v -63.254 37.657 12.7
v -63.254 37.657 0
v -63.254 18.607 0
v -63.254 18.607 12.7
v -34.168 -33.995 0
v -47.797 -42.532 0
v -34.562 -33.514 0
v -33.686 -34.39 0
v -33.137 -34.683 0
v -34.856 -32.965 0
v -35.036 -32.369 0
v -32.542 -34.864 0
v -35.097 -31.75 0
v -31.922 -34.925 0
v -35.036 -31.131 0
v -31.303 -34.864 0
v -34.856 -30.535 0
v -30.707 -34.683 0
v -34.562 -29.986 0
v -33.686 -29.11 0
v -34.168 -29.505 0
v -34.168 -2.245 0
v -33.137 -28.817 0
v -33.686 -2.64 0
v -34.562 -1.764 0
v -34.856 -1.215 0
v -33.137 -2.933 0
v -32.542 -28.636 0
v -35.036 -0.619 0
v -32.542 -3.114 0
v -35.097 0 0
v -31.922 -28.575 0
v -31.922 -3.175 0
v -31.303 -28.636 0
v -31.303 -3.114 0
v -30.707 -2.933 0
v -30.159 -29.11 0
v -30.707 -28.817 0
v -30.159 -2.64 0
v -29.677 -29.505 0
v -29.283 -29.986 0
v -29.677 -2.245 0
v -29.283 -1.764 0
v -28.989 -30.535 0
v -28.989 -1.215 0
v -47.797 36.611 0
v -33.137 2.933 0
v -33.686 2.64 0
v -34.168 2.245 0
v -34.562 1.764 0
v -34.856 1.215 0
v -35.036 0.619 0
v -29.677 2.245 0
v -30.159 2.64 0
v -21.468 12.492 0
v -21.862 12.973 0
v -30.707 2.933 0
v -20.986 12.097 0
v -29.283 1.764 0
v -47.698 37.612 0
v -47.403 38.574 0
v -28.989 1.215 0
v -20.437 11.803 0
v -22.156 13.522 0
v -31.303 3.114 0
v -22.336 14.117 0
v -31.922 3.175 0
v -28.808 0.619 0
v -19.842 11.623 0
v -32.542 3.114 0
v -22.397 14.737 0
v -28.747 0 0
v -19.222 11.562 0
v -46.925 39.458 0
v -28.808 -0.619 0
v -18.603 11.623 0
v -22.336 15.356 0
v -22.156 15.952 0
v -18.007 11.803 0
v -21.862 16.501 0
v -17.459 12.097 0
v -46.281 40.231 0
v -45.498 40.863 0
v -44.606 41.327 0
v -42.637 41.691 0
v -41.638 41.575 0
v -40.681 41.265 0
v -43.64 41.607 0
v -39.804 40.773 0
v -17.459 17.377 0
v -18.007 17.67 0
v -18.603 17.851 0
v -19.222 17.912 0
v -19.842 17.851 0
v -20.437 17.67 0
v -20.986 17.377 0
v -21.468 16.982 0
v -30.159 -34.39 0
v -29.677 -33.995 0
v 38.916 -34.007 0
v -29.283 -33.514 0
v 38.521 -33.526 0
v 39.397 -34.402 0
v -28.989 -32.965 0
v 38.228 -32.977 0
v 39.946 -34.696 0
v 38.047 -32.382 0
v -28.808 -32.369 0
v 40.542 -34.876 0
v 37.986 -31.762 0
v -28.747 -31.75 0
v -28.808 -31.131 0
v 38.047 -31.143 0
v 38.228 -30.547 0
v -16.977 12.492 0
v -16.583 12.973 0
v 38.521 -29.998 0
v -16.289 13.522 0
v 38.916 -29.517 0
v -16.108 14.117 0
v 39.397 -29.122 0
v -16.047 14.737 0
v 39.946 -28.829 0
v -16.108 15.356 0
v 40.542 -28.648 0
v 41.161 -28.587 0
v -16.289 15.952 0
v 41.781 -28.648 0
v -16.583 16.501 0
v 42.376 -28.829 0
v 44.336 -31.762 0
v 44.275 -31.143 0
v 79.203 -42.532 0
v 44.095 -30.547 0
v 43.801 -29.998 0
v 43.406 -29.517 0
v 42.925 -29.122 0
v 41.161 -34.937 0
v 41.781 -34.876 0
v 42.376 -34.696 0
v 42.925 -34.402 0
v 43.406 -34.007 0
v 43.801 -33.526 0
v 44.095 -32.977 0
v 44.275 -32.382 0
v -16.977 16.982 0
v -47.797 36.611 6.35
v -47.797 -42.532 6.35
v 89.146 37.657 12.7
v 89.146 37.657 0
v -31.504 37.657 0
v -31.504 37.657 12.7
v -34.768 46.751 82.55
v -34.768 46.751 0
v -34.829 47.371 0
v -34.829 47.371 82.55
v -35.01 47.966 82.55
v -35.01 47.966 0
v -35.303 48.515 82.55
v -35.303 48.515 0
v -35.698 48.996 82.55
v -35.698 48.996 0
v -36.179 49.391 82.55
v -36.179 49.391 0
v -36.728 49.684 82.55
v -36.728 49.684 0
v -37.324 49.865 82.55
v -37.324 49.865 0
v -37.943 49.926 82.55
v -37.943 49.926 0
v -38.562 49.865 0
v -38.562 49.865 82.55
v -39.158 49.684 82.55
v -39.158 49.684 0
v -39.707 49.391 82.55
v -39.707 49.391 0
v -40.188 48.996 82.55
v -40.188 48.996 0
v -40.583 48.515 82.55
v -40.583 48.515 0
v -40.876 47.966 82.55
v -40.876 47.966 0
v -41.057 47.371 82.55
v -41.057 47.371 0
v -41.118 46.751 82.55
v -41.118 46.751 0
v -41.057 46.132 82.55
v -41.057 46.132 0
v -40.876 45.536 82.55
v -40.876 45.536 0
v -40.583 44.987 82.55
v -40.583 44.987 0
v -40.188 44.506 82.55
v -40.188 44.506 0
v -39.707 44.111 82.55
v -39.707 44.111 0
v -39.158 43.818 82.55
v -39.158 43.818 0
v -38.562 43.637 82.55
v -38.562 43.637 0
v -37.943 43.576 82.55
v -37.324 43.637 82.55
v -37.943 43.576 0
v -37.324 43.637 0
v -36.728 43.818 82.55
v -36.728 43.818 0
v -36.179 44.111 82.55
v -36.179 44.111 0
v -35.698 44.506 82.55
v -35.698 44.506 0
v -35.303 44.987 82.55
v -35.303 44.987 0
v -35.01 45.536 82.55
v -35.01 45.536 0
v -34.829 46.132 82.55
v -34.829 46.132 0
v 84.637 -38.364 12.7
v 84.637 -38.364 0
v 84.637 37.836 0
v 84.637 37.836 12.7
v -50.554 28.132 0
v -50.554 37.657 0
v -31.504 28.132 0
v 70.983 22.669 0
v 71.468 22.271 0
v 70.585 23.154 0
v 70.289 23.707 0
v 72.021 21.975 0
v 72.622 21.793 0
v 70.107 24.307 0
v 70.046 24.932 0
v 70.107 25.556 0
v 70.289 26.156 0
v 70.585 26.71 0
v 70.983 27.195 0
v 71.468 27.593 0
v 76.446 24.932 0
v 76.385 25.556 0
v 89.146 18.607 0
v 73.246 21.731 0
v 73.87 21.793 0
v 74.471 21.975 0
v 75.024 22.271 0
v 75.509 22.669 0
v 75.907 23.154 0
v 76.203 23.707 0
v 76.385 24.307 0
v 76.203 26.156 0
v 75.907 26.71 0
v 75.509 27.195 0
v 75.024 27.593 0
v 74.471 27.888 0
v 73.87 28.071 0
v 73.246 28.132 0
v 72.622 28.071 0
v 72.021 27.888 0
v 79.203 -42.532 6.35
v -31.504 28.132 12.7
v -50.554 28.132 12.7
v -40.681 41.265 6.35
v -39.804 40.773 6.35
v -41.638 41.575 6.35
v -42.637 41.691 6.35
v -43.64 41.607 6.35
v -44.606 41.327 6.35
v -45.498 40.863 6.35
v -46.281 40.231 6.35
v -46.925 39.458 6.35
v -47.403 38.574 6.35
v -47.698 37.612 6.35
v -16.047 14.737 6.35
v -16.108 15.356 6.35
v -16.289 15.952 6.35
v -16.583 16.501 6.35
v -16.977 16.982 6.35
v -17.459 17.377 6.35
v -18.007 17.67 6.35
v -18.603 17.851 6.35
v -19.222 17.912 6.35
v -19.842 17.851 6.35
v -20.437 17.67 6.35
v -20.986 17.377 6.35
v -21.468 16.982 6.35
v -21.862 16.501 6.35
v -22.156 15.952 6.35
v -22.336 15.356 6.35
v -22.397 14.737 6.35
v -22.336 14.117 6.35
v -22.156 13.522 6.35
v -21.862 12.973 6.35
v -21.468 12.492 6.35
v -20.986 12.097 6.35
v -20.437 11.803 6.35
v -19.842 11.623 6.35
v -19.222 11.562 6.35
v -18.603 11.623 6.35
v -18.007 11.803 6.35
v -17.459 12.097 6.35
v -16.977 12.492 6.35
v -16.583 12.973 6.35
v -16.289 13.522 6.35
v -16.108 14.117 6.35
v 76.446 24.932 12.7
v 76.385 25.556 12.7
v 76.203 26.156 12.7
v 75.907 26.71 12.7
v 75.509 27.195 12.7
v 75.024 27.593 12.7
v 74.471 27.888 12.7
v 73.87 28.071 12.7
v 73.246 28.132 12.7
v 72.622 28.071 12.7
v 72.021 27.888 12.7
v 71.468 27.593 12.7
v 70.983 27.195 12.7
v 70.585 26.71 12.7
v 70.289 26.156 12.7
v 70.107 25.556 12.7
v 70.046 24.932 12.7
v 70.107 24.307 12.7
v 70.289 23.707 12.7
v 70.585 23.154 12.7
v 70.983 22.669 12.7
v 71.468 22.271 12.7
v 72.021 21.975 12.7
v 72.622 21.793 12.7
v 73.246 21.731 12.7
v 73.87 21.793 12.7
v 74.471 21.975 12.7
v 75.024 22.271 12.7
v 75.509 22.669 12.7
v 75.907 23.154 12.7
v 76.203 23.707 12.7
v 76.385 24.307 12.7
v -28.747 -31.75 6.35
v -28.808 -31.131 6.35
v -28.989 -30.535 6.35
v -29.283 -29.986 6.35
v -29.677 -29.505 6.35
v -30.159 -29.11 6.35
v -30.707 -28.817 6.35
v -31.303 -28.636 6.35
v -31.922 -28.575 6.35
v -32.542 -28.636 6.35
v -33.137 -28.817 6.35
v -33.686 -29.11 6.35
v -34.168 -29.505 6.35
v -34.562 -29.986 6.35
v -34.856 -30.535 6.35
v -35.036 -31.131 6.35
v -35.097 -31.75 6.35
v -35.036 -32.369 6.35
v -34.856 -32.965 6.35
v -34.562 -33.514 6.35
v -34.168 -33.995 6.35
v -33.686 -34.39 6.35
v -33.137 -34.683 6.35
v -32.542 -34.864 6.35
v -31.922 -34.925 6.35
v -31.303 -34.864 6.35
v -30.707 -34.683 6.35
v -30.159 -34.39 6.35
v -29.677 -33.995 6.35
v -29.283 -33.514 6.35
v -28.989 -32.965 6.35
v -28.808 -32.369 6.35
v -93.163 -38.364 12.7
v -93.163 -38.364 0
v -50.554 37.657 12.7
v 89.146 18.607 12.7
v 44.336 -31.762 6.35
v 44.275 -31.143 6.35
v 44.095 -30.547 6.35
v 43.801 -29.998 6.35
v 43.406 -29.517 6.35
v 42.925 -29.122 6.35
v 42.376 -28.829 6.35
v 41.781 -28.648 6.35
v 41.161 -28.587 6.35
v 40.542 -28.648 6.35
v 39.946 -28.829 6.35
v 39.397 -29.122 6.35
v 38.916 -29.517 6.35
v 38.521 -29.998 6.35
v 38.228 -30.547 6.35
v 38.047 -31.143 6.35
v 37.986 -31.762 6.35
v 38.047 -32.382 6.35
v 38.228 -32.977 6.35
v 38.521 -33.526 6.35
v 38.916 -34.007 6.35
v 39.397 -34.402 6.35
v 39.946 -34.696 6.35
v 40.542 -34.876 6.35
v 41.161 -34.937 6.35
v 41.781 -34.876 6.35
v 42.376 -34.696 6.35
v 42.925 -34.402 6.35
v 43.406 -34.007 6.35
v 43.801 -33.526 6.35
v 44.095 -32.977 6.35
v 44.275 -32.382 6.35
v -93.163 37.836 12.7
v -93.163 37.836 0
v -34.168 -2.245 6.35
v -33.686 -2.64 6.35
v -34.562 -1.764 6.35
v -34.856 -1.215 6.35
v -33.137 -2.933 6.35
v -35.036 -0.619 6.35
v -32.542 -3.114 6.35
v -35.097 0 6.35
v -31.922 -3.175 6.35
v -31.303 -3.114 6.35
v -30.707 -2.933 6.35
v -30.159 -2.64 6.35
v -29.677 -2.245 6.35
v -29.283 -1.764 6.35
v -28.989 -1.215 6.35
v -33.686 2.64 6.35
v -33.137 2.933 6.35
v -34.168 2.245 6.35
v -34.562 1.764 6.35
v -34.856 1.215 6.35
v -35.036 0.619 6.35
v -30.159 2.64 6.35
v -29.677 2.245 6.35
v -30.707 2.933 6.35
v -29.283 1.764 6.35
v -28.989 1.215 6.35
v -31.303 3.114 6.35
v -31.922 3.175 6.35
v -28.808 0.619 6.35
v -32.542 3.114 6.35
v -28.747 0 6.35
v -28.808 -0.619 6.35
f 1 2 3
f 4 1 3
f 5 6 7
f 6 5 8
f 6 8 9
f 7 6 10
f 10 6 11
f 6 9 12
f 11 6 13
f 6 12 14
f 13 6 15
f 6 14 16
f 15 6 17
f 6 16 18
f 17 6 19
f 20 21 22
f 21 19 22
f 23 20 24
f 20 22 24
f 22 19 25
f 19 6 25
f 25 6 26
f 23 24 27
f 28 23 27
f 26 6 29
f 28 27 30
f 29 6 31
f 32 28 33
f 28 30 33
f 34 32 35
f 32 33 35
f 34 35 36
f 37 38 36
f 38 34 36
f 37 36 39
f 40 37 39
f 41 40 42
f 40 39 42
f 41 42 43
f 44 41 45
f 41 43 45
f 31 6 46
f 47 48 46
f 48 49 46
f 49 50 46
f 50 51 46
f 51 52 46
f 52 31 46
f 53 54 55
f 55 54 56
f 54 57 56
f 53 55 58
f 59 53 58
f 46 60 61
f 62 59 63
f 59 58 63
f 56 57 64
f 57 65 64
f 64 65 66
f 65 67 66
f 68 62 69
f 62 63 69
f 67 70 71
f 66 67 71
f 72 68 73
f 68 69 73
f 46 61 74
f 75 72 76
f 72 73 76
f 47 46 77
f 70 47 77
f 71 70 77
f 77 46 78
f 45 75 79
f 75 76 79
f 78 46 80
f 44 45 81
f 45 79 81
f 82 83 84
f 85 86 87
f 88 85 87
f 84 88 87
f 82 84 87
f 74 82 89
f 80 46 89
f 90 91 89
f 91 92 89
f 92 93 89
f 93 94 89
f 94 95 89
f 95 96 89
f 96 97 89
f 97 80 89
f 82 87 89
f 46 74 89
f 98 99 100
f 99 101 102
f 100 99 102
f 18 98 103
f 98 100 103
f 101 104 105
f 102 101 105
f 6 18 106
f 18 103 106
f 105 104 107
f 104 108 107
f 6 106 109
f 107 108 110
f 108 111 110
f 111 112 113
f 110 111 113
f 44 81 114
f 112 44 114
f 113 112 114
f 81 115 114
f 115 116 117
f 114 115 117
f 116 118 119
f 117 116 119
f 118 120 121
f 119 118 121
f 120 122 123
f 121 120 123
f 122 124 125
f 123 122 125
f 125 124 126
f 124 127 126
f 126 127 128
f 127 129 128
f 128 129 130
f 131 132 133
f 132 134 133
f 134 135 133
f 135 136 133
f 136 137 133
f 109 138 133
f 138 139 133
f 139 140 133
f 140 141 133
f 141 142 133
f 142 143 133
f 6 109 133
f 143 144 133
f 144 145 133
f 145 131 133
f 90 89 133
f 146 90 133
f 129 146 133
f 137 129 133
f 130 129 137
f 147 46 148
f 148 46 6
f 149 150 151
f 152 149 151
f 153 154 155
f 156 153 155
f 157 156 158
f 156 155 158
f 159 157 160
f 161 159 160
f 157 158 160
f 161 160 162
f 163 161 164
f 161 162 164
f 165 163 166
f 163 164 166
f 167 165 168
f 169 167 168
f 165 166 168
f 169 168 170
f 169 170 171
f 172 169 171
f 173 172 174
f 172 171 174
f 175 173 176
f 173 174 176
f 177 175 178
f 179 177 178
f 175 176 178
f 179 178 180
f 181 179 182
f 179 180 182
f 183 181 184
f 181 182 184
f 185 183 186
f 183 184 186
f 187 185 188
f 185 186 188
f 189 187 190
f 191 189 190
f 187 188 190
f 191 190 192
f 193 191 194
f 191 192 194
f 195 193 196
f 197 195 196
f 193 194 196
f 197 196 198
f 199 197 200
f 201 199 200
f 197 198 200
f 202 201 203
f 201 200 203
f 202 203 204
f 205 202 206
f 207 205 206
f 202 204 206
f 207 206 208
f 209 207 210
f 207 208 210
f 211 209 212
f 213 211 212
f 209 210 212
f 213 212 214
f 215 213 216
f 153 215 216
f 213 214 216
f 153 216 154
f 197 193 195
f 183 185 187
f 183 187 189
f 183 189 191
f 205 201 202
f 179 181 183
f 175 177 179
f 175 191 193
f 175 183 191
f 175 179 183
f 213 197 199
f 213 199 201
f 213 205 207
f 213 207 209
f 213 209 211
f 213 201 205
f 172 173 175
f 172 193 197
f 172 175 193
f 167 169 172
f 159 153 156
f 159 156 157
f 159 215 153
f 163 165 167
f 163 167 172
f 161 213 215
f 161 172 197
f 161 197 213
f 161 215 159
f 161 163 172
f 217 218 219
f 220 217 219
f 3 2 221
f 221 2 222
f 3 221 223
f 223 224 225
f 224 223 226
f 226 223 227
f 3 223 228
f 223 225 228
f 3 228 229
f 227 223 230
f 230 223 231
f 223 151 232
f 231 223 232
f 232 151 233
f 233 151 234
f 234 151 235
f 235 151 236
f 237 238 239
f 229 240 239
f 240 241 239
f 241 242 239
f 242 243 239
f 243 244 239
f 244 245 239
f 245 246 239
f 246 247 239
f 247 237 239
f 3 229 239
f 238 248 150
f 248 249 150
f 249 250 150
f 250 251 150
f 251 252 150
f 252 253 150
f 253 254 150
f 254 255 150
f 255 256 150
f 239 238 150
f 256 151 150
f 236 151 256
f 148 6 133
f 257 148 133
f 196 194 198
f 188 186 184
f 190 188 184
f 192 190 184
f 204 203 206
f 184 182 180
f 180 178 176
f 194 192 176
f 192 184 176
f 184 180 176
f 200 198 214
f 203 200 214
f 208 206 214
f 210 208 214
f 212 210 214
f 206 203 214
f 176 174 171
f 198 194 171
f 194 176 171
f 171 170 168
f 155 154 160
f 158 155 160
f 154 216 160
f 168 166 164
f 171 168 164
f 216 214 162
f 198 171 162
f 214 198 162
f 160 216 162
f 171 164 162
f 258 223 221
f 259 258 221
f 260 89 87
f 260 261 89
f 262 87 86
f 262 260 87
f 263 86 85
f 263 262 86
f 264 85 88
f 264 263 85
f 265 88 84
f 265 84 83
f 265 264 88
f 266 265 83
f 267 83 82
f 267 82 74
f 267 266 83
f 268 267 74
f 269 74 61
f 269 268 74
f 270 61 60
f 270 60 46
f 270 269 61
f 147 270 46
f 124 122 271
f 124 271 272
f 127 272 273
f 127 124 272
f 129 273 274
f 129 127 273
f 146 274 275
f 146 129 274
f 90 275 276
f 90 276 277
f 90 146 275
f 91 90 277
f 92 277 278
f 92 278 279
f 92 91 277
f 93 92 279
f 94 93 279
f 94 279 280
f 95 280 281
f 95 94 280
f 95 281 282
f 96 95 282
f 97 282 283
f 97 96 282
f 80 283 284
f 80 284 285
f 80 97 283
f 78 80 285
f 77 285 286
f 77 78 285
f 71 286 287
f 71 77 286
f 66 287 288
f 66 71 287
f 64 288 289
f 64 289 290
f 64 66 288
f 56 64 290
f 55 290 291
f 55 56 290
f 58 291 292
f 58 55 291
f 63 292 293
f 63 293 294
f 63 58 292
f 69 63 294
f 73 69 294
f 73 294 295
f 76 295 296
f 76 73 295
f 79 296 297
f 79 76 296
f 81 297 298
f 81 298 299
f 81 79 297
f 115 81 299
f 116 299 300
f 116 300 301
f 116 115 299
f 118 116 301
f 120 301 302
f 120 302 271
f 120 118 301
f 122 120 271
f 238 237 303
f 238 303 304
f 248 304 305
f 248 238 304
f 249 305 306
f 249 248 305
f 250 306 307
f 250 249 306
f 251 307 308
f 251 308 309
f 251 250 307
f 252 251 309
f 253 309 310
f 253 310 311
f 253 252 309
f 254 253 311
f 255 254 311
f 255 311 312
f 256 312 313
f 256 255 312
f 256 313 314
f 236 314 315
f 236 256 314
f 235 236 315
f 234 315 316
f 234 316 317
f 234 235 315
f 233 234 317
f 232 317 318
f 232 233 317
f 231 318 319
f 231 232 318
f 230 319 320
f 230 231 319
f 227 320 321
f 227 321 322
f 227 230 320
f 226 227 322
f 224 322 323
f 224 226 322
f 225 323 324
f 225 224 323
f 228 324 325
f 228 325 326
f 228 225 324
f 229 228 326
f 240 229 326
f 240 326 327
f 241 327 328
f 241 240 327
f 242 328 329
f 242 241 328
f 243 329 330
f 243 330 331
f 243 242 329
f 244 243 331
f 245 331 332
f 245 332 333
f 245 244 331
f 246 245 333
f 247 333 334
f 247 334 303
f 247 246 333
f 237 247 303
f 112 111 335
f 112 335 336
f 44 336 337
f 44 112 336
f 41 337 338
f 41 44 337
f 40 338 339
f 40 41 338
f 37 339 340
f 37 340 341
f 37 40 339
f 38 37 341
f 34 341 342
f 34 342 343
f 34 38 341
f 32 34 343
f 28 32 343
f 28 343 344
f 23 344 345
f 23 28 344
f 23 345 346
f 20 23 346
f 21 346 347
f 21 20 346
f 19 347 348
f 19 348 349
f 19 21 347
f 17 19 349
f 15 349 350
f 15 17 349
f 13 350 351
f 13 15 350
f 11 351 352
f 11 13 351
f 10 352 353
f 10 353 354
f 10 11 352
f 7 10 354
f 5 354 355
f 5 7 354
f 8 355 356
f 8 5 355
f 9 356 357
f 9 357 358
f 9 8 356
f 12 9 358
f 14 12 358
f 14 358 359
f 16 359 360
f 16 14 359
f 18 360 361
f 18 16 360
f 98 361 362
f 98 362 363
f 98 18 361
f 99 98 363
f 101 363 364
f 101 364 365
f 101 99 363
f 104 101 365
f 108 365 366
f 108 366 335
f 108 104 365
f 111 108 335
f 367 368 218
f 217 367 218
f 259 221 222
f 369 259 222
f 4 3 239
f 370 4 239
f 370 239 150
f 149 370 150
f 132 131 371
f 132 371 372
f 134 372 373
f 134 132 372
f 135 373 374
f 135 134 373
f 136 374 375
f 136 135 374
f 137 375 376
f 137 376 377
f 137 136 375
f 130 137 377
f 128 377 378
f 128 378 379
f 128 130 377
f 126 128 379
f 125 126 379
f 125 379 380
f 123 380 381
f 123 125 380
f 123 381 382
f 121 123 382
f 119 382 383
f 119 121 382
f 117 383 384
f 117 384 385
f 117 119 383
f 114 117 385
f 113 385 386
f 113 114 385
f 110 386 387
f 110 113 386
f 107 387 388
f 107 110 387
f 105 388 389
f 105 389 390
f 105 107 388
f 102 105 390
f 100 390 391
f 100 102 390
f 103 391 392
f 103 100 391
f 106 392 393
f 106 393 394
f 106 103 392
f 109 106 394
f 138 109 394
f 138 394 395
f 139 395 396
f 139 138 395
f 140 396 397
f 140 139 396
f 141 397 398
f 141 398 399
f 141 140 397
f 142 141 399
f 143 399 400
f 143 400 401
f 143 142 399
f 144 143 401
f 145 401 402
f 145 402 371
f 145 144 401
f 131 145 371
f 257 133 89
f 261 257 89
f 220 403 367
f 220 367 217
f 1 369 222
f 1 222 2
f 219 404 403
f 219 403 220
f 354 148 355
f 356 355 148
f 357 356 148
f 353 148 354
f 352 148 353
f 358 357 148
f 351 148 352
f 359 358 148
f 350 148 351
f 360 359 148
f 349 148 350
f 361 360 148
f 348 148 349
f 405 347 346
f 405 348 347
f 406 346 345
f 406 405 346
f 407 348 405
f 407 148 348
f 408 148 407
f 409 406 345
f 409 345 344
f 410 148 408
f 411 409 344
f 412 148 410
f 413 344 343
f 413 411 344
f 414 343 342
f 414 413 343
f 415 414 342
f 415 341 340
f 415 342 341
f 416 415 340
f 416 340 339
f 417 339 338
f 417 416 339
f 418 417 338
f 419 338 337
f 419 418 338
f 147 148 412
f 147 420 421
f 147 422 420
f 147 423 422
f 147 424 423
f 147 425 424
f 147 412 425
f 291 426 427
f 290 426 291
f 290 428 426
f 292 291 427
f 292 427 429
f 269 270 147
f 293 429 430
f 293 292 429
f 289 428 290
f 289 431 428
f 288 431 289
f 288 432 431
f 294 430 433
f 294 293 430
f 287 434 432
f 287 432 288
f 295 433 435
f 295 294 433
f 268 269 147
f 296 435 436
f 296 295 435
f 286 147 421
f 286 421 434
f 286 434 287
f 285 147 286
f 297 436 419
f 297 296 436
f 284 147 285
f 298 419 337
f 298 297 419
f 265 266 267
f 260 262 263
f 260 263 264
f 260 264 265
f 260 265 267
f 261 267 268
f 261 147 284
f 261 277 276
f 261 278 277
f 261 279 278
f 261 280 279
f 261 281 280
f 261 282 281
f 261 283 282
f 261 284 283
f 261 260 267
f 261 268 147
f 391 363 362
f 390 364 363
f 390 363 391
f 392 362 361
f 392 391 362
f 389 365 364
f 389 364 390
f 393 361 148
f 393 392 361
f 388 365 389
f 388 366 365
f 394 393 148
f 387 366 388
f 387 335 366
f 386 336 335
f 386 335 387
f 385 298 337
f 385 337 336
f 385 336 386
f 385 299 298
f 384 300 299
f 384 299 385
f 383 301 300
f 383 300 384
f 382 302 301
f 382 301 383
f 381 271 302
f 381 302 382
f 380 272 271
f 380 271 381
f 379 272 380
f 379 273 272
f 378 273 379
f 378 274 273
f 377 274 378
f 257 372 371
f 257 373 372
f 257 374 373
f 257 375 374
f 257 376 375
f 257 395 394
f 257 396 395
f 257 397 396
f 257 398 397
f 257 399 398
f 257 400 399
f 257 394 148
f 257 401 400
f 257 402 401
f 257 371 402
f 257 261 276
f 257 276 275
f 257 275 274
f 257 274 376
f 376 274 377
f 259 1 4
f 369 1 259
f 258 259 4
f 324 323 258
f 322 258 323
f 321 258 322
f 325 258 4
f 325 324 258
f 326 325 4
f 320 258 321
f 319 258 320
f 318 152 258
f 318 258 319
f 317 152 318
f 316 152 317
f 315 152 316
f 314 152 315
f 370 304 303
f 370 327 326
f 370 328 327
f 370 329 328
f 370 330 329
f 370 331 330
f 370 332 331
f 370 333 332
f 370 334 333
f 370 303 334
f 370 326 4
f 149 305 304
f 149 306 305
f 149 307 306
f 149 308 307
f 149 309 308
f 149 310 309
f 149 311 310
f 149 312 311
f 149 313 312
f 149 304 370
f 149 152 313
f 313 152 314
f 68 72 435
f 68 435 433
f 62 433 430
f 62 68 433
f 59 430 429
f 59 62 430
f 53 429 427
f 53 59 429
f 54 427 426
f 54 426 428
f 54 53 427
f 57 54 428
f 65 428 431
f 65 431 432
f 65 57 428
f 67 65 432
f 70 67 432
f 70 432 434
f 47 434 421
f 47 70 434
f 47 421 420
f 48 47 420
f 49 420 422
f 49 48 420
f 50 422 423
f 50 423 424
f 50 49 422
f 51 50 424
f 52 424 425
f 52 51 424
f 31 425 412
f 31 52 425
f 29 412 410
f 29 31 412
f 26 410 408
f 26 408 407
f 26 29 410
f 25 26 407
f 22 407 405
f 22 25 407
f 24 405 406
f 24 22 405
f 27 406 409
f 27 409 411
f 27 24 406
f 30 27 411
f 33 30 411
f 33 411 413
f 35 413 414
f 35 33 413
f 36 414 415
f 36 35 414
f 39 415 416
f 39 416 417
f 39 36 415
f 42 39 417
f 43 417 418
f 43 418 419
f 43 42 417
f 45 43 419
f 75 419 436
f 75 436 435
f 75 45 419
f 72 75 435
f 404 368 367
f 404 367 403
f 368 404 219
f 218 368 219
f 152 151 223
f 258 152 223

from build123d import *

# Parameters (mm, degrees)
F0_R     = 3.175
F1_DEPTH = 82.55
F2_W     = 177.8
F2_H     = 76.2
F3_DEPTH = 12.7
F4_R     = 3.175
F5_DEPTH = 6.35
F6_R     = 5.08
F7_R     = 3.2004
F8_DEPTH = 12.7


with BuildPart() as f1:
    # F0 (on Top) → F1 (new body)
    with BuildSketch(Plane.XY):
        with Locations((-37.942946, 46.751104)):
            Circle(F0_R)
    extrude(amount=F1_DEPTH)


with BuildPart() as f3:
    # F2 (on Top) → F3 (new body)
    with BuildSketch(Plane.XY):
        with Locations((-4.262611, -0.264204)):
            Rectangle(F2_W, F2_H)
    extrude(amount=F3_DEPTH)


with BuildPart() as f5:
    # F4 (on Top) → F5 (new body)
    with BuildSketch(Plane.XY):
        Polygon((79.202562, -42.531908), (-47.797438, 46.368092), (-47.797438, -42.531908), align=None)
        with Locations((-31.922438, -31.75)):
            Circle(F4_R, mode=Mode.SUBTRACT)
        with Locations((-31.922438, 0)):
            Circle(F4_R, mode=Mode.SUBTRACT)
        with Locations((41.161284, -31.762308)):
            Circle(F4_R, mode=Mode.SUBTRACT)
        with Locations((-19.222438, 14.736757)):
            Circle(F4_R, mode=Mode.SUBTRACT)
    extrude(amount=F5_DEPTH)

    # F6
    f6_edges = [f5.edges().sort_by_distance(p)[0] for p in [
        (-47.797438, 46.368092, 3.175),
    ]]
    fillet(f6_edges, radius=F6_R)


with BuildPart() as f8:
    # F7 (on Top) → F8 (new body)
    with BuildSketch(Plane.XY):
        Polygon((-50.553657, 37.657042), (-63.253657, 37.657042), (-63.253657, 18.607042), (89.146343, 18.607042), (89.146343, 37.657042), (-31.503657, 37.657042), (-31.503657, 28.132042), (-50.553657, 28.132042), align=None)
        with Locations((73.245943, 24.931642)):
            Circle(F7_R, mode=Mode.SUBTRACT)
    extrude(amount=F8_DEPTH)


solid = Compound([f1.part, f3.part, f5.part, f8.part])
